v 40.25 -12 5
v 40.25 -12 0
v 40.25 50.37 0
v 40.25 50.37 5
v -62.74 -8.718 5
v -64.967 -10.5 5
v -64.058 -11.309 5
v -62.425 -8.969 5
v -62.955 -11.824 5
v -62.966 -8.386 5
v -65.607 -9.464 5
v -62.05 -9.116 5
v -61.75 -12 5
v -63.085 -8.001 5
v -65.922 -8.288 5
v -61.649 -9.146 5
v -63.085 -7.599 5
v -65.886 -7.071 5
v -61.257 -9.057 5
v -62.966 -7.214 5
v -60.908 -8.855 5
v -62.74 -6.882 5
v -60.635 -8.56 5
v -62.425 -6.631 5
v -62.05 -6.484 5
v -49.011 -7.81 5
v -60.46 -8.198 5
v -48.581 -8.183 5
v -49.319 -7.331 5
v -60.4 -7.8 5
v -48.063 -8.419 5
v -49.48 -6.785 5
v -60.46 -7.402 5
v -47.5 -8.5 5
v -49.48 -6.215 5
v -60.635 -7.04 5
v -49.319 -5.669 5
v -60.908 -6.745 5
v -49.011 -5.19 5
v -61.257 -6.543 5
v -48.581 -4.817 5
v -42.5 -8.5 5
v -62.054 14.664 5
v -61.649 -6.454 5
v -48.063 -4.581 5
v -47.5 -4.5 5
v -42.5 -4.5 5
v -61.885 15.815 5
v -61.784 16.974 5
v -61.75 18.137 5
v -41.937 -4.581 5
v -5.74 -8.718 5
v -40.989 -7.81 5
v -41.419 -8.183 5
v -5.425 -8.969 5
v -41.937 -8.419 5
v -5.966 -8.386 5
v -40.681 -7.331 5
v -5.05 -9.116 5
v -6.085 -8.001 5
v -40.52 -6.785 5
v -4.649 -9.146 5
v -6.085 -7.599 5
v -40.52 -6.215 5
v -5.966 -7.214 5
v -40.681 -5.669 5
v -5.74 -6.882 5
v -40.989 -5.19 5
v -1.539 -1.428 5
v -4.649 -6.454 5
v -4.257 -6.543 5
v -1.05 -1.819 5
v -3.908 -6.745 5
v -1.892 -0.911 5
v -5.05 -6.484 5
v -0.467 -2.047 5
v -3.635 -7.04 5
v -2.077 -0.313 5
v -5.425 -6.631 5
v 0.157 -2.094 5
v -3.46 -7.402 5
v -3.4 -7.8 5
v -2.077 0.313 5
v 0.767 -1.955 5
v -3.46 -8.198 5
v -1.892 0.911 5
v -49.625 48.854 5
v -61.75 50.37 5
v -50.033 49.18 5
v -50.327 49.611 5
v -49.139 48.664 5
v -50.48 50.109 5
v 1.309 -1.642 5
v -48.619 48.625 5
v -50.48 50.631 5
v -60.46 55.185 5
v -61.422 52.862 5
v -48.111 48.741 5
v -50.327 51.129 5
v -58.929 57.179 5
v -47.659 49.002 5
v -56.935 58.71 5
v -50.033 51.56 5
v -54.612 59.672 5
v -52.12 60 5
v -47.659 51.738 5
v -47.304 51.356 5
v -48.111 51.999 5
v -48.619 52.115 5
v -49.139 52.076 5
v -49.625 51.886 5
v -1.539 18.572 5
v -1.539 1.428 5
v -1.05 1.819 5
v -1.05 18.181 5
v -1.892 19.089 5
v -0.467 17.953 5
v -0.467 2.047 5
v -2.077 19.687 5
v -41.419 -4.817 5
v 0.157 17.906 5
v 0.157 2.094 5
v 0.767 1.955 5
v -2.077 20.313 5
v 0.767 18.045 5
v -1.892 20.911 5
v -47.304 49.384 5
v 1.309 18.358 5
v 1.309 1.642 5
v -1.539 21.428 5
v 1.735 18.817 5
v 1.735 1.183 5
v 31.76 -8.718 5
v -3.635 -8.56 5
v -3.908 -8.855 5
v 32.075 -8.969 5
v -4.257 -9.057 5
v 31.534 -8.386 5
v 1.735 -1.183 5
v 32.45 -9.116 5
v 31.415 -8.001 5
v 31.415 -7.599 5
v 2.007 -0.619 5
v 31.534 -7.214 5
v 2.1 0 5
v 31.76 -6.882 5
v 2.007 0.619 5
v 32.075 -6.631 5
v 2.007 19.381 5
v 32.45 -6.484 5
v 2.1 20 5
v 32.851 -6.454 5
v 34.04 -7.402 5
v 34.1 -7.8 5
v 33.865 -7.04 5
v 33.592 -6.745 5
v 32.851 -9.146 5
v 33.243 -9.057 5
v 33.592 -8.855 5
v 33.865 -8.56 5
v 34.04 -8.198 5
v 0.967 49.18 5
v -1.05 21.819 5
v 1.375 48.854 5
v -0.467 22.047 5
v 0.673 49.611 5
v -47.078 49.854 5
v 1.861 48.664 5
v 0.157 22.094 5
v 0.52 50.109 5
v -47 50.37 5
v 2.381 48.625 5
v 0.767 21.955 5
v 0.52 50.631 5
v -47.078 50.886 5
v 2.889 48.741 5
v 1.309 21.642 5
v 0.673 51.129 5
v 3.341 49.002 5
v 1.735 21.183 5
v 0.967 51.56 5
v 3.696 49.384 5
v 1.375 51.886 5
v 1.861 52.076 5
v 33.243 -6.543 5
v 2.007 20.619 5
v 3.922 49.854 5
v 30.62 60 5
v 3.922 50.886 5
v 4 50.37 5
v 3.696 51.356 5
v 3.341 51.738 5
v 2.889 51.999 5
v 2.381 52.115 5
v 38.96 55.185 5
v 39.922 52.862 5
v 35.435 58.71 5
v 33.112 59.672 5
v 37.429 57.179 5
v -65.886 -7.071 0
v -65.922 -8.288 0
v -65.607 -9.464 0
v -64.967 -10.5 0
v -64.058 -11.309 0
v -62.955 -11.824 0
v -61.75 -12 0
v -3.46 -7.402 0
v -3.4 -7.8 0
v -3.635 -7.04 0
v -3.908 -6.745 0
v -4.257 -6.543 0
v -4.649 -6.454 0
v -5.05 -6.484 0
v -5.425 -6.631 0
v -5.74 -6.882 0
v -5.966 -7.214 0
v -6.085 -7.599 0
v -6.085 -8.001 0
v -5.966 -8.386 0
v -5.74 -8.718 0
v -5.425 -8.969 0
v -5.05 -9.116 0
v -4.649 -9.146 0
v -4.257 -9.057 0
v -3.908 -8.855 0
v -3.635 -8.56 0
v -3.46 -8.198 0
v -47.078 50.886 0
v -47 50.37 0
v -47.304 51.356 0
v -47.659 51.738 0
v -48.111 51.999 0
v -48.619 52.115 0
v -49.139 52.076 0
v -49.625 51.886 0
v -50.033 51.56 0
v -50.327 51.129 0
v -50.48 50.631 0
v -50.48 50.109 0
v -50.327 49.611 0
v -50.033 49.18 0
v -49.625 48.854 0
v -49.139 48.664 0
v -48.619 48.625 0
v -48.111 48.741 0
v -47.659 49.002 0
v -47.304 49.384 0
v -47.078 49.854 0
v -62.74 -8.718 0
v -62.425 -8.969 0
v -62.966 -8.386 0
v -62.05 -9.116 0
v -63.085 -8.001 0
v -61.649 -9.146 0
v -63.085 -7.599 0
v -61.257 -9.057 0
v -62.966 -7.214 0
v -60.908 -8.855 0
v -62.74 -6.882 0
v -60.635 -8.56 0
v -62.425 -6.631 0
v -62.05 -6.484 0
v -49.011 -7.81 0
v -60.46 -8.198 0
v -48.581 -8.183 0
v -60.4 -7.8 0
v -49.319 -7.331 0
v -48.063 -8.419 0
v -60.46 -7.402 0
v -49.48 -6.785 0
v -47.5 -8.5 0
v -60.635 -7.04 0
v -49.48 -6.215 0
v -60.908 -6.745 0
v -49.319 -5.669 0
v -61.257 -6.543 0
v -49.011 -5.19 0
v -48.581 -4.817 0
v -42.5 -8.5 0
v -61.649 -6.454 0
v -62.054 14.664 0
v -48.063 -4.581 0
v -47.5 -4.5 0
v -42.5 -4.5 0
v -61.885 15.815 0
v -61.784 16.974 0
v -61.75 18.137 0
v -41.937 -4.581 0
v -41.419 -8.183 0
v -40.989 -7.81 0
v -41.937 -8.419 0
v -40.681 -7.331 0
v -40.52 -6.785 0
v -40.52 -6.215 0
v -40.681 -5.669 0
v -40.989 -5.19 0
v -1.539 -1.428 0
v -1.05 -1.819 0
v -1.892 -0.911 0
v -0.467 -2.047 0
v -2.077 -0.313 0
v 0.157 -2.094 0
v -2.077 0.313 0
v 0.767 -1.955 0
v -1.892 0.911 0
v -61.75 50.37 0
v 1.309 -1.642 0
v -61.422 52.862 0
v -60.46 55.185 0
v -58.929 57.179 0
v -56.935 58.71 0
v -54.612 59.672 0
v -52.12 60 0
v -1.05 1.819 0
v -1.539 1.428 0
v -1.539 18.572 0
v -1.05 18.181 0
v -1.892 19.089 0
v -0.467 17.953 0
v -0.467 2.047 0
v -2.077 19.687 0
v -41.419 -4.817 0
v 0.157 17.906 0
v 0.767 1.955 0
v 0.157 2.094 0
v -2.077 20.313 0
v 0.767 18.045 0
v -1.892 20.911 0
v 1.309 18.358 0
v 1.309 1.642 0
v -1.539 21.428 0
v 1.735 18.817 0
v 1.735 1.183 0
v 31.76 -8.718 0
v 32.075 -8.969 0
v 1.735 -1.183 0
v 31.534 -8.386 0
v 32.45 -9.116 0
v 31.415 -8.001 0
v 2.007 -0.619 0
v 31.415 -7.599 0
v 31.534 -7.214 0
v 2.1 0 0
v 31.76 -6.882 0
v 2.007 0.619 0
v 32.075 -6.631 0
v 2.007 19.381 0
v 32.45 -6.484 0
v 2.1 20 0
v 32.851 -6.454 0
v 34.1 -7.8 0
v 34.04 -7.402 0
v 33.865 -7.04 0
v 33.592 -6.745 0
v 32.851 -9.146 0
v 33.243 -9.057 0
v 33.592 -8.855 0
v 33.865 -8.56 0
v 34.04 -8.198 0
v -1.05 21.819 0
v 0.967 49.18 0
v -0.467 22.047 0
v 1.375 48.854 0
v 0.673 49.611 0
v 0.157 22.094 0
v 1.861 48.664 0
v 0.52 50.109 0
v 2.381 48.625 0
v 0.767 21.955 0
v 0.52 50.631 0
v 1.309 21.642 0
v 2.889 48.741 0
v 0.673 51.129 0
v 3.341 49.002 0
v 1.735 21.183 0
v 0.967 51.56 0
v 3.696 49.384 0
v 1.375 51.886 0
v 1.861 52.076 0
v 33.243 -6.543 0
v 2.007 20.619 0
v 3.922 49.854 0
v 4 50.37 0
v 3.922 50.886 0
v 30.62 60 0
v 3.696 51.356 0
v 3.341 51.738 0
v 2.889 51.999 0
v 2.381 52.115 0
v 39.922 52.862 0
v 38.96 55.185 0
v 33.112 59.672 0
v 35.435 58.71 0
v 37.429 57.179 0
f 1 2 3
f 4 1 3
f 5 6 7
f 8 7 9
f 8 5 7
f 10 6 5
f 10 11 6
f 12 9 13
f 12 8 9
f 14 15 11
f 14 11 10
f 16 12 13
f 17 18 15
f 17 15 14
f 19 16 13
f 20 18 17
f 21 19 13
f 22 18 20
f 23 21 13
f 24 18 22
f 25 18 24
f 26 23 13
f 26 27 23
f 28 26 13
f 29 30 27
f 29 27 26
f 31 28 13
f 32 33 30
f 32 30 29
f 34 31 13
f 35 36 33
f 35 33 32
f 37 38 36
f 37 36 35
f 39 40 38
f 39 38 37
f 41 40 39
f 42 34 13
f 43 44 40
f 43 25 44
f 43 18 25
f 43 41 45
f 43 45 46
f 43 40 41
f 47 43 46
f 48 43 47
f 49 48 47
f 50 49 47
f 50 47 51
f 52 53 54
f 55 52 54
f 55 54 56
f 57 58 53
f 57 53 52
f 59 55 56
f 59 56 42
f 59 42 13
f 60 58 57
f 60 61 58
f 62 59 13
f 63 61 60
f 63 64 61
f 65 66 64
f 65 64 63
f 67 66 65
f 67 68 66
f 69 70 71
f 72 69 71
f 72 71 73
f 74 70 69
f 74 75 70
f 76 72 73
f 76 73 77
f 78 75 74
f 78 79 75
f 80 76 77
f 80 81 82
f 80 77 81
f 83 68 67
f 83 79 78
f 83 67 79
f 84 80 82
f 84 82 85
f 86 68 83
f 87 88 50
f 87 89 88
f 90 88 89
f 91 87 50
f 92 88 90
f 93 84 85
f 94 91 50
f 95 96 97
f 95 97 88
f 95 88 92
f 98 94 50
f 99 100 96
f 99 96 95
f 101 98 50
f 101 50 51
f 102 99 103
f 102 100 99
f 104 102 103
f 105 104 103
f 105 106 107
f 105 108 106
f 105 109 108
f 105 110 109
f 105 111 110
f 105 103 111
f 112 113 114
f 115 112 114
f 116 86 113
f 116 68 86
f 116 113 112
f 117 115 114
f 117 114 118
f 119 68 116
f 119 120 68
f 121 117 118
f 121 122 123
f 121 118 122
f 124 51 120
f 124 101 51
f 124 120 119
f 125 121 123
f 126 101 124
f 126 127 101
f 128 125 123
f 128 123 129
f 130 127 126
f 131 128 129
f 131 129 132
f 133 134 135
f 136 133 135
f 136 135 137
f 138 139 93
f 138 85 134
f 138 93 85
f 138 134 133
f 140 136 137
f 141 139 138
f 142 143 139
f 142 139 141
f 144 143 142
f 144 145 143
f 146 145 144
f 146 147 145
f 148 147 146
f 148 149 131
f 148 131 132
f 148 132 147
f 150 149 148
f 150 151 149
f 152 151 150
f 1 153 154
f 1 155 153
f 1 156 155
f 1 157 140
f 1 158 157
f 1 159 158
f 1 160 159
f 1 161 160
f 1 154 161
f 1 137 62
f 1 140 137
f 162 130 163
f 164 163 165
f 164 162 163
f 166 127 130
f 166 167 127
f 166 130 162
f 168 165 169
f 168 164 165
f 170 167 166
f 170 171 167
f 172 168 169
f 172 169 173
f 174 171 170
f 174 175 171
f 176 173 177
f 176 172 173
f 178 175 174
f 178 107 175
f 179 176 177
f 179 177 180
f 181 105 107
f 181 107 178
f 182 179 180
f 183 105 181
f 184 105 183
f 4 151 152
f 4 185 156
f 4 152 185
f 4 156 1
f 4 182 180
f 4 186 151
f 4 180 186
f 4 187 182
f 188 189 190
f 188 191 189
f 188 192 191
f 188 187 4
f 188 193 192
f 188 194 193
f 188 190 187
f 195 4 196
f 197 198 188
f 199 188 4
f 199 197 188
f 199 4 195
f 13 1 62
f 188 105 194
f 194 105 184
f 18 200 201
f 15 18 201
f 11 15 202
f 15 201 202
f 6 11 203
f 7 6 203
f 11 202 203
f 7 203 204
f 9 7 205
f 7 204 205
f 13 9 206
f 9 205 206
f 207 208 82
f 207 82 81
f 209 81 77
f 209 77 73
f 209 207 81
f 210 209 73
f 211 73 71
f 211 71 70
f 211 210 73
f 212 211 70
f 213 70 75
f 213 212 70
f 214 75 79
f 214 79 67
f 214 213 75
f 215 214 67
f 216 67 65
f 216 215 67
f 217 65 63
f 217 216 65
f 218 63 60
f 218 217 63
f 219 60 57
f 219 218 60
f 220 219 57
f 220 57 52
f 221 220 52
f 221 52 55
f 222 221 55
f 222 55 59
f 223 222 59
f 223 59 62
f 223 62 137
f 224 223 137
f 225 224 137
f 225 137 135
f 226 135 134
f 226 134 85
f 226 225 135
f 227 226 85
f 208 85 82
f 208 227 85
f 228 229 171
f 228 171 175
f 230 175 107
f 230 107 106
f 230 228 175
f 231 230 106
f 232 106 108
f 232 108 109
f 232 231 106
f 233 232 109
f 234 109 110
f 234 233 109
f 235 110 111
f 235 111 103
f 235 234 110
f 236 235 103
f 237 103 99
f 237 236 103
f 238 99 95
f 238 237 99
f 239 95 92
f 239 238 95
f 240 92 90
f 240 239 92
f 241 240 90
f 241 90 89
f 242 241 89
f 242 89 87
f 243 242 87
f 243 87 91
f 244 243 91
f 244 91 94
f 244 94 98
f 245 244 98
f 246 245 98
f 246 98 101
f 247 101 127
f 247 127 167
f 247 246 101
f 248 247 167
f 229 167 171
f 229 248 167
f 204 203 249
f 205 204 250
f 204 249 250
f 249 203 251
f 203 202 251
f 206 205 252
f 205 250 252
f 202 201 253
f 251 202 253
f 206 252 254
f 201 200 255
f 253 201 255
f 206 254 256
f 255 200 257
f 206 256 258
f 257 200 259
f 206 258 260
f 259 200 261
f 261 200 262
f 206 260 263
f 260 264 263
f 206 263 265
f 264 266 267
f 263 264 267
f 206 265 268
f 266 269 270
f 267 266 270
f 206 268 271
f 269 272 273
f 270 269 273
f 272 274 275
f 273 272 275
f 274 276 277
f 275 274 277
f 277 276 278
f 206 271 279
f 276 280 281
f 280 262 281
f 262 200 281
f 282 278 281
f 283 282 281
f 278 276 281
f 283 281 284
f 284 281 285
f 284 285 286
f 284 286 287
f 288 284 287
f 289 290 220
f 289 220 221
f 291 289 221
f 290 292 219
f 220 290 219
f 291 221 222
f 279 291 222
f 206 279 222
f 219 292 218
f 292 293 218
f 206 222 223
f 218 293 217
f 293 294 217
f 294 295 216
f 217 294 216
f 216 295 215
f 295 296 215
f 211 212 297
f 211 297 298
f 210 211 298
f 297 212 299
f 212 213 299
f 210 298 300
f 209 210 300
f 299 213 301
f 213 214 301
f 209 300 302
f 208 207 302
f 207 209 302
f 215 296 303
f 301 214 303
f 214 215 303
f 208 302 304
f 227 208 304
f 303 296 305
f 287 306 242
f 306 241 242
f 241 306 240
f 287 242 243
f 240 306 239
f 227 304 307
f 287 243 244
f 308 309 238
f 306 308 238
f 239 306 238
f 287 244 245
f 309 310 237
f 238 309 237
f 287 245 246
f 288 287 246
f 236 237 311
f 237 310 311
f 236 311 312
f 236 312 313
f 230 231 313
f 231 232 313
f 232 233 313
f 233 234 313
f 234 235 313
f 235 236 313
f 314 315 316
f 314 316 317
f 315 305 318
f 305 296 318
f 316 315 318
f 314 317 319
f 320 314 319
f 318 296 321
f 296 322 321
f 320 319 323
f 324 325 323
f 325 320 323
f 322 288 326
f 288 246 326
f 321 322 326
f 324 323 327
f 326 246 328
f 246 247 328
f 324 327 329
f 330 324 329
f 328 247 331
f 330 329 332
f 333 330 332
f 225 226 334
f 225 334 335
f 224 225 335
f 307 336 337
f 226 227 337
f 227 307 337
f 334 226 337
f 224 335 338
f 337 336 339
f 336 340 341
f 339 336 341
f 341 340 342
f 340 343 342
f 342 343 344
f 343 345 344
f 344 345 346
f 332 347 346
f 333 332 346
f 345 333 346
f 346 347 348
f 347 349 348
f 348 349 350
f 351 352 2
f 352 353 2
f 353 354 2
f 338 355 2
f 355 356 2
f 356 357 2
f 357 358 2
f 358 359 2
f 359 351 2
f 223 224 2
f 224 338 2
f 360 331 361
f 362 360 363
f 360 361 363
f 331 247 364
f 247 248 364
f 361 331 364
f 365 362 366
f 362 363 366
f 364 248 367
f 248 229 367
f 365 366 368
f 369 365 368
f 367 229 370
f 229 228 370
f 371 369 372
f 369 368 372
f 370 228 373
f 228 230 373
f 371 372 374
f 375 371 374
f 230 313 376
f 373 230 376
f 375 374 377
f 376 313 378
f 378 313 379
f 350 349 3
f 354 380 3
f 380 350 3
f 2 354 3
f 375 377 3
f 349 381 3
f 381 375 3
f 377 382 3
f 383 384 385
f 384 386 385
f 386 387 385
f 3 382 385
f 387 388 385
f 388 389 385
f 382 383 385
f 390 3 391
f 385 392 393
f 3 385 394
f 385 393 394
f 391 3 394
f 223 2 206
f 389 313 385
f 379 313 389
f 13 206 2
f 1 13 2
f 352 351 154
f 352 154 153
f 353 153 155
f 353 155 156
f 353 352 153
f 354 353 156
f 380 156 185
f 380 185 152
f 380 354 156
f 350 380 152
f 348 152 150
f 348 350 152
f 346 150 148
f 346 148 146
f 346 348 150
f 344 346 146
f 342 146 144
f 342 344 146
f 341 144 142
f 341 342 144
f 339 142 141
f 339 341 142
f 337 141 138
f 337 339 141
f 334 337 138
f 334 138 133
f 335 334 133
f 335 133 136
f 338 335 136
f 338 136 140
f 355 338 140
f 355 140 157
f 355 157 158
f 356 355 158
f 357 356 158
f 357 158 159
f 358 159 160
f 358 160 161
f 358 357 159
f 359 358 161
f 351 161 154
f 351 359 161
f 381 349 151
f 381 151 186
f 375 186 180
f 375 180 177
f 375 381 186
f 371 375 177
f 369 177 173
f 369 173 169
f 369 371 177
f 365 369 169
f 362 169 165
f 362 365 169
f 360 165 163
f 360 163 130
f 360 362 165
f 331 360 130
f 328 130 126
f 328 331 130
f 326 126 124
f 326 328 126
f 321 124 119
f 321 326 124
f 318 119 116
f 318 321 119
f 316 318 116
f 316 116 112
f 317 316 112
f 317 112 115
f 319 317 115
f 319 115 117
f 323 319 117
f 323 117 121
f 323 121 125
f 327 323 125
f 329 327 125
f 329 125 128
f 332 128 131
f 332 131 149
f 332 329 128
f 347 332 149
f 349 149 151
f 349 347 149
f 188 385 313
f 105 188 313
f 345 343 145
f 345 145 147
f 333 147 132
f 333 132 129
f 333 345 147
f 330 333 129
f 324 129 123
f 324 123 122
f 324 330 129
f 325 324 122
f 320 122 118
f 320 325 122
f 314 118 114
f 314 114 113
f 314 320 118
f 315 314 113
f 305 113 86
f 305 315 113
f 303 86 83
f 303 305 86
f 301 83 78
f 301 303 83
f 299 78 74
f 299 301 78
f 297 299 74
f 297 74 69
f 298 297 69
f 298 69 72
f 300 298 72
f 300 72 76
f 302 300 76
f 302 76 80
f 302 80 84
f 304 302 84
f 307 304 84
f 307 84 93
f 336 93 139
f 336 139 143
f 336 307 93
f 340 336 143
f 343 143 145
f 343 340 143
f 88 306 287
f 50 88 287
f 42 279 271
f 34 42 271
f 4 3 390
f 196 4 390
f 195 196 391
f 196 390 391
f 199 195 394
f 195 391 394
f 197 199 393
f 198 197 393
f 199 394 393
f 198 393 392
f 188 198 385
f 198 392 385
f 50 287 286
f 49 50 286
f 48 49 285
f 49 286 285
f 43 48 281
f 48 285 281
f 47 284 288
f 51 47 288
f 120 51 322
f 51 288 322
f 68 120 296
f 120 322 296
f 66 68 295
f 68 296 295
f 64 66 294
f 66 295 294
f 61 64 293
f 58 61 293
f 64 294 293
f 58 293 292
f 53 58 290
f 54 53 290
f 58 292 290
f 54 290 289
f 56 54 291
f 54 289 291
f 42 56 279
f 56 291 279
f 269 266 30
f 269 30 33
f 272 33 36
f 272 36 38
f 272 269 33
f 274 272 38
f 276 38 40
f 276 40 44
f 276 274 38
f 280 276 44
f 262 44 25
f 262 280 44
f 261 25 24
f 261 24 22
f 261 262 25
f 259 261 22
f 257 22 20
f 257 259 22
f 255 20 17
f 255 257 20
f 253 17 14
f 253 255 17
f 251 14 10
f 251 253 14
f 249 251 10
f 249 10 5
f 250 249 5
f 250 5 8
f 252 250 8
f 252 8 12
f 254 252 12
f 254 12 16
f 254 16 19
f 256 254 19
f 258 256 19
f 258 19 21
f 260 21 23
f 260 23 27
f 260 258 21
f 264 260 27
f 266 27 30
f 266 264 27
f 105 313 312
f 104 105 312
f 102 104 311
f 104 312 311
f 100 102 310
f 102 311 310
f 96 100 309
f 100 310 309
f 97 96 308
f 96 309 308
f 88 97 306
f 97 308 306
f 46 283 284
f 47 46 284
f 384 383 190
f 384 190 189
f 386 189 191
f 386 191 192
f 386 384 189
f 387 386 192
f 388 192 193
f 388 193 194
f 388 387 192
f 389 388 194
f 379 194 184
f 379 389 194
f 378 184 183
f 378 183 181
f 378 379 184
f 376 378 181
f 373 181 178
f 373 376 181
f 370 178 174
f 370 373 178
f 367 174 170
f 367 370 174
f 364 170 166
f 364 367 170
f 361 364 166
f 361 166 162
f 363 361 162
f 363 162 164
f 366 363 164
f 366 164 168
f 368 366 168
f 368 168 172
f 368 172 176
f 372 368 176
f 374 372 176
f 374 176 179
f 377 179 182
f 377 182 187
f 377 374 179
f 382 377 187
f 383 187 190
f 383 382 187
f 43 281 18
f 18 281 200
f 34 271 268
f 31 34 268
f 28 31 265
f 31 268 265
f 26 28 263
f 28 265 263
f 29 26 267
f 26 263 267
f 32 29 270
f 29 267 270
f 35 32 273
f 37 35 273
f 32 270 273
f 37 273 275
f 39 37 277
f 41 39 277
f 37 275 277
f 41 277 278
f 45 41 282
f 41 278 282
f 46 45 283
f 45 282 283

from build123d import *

# Parameters (mm, degrees)
SKETCH1_R           = 2.1
SKETCH1_R_2         = 1.75
SKETCH1_R_3         = 1.35
BOSS_EXTRUDE1_DEPTH = 5


with BuildPart() as part:
    # Sketch1 → Boss-Extrude1 (new body)
    with BuildSketch(Plane.XY):
        with BuildLine():
            Line((-62.05384494, 14.663645746), (-65.886192563, -7.070677654))
            ThreePointArc((-65.886192563, -7.070677654), (-64.967386661, -10.499707961), (-61.75, -12))
            Line((-61.75, -12), (40.25, -12))
            Line((40.25, -12), (40.25, 50.37))
            ThreePointArc((40.25, 50.37), (37.429438303, 57.179438303), (30.62, 60))
            Line((30.62, 60), (-52.12, 60))
            ThreePointArc((-52.12, 60), (-58.929438303, 57.179438303), (-61.75, 50.37))
            Line((-61.75, 50.37), (-61.75, 18.1366093))
            ThreePointArc((-61.75, 18.1366093), (-61.826106038, 16.393494445), (-62.05384494, 14.663645746))
        make_face()
        Circle(SKETCH1_R, mode=Mode.SUBTRACT)
        with Locations((-48.75, 50.37)):
            Circle(SKETCH1_R_2, mode=Mode.SUBTRACT)
        with Locations((32.75, -7.8)):
            Circle(SKETCH1_R_3, mode=Mode.SUBTRACT)
        with Locations((2.25, 50.37)):
            Circle(SKETCH1_R_2, mode=Mode.SUBTRACT)
        with Locations((-61.75, -7.8)):
            Circle(SKETCH1_R_3, mode=Mode.SUBTRACT)
        with Locations((-4.75, -7.8)):
            Circle(SKETCH1_R_3, mode=Mode.SUBTRACT)
        with Locations((0, 20)):
            Circle(SKETCH1_R, mode=Mode.SUBTRACT)
        with BuildLine():
            Line((-47.5, -4.5), (-42.5, -4.5))
            ThreePointArc((-42.5, -4.5), (-40.5, -6.5), (-42.5, -8.5))
            Line((-42.5, -8.5), (-47.5, -8.5))
            ThreePointArc((-47.5, -8.5), (-49.5, -6.5), (-47.5, -4.5))
        make_face(mode=Mode.SUBTRACT)
    extrude(amount=BOSS_EXTRUDE1_DEPTH)


solid = part.part
